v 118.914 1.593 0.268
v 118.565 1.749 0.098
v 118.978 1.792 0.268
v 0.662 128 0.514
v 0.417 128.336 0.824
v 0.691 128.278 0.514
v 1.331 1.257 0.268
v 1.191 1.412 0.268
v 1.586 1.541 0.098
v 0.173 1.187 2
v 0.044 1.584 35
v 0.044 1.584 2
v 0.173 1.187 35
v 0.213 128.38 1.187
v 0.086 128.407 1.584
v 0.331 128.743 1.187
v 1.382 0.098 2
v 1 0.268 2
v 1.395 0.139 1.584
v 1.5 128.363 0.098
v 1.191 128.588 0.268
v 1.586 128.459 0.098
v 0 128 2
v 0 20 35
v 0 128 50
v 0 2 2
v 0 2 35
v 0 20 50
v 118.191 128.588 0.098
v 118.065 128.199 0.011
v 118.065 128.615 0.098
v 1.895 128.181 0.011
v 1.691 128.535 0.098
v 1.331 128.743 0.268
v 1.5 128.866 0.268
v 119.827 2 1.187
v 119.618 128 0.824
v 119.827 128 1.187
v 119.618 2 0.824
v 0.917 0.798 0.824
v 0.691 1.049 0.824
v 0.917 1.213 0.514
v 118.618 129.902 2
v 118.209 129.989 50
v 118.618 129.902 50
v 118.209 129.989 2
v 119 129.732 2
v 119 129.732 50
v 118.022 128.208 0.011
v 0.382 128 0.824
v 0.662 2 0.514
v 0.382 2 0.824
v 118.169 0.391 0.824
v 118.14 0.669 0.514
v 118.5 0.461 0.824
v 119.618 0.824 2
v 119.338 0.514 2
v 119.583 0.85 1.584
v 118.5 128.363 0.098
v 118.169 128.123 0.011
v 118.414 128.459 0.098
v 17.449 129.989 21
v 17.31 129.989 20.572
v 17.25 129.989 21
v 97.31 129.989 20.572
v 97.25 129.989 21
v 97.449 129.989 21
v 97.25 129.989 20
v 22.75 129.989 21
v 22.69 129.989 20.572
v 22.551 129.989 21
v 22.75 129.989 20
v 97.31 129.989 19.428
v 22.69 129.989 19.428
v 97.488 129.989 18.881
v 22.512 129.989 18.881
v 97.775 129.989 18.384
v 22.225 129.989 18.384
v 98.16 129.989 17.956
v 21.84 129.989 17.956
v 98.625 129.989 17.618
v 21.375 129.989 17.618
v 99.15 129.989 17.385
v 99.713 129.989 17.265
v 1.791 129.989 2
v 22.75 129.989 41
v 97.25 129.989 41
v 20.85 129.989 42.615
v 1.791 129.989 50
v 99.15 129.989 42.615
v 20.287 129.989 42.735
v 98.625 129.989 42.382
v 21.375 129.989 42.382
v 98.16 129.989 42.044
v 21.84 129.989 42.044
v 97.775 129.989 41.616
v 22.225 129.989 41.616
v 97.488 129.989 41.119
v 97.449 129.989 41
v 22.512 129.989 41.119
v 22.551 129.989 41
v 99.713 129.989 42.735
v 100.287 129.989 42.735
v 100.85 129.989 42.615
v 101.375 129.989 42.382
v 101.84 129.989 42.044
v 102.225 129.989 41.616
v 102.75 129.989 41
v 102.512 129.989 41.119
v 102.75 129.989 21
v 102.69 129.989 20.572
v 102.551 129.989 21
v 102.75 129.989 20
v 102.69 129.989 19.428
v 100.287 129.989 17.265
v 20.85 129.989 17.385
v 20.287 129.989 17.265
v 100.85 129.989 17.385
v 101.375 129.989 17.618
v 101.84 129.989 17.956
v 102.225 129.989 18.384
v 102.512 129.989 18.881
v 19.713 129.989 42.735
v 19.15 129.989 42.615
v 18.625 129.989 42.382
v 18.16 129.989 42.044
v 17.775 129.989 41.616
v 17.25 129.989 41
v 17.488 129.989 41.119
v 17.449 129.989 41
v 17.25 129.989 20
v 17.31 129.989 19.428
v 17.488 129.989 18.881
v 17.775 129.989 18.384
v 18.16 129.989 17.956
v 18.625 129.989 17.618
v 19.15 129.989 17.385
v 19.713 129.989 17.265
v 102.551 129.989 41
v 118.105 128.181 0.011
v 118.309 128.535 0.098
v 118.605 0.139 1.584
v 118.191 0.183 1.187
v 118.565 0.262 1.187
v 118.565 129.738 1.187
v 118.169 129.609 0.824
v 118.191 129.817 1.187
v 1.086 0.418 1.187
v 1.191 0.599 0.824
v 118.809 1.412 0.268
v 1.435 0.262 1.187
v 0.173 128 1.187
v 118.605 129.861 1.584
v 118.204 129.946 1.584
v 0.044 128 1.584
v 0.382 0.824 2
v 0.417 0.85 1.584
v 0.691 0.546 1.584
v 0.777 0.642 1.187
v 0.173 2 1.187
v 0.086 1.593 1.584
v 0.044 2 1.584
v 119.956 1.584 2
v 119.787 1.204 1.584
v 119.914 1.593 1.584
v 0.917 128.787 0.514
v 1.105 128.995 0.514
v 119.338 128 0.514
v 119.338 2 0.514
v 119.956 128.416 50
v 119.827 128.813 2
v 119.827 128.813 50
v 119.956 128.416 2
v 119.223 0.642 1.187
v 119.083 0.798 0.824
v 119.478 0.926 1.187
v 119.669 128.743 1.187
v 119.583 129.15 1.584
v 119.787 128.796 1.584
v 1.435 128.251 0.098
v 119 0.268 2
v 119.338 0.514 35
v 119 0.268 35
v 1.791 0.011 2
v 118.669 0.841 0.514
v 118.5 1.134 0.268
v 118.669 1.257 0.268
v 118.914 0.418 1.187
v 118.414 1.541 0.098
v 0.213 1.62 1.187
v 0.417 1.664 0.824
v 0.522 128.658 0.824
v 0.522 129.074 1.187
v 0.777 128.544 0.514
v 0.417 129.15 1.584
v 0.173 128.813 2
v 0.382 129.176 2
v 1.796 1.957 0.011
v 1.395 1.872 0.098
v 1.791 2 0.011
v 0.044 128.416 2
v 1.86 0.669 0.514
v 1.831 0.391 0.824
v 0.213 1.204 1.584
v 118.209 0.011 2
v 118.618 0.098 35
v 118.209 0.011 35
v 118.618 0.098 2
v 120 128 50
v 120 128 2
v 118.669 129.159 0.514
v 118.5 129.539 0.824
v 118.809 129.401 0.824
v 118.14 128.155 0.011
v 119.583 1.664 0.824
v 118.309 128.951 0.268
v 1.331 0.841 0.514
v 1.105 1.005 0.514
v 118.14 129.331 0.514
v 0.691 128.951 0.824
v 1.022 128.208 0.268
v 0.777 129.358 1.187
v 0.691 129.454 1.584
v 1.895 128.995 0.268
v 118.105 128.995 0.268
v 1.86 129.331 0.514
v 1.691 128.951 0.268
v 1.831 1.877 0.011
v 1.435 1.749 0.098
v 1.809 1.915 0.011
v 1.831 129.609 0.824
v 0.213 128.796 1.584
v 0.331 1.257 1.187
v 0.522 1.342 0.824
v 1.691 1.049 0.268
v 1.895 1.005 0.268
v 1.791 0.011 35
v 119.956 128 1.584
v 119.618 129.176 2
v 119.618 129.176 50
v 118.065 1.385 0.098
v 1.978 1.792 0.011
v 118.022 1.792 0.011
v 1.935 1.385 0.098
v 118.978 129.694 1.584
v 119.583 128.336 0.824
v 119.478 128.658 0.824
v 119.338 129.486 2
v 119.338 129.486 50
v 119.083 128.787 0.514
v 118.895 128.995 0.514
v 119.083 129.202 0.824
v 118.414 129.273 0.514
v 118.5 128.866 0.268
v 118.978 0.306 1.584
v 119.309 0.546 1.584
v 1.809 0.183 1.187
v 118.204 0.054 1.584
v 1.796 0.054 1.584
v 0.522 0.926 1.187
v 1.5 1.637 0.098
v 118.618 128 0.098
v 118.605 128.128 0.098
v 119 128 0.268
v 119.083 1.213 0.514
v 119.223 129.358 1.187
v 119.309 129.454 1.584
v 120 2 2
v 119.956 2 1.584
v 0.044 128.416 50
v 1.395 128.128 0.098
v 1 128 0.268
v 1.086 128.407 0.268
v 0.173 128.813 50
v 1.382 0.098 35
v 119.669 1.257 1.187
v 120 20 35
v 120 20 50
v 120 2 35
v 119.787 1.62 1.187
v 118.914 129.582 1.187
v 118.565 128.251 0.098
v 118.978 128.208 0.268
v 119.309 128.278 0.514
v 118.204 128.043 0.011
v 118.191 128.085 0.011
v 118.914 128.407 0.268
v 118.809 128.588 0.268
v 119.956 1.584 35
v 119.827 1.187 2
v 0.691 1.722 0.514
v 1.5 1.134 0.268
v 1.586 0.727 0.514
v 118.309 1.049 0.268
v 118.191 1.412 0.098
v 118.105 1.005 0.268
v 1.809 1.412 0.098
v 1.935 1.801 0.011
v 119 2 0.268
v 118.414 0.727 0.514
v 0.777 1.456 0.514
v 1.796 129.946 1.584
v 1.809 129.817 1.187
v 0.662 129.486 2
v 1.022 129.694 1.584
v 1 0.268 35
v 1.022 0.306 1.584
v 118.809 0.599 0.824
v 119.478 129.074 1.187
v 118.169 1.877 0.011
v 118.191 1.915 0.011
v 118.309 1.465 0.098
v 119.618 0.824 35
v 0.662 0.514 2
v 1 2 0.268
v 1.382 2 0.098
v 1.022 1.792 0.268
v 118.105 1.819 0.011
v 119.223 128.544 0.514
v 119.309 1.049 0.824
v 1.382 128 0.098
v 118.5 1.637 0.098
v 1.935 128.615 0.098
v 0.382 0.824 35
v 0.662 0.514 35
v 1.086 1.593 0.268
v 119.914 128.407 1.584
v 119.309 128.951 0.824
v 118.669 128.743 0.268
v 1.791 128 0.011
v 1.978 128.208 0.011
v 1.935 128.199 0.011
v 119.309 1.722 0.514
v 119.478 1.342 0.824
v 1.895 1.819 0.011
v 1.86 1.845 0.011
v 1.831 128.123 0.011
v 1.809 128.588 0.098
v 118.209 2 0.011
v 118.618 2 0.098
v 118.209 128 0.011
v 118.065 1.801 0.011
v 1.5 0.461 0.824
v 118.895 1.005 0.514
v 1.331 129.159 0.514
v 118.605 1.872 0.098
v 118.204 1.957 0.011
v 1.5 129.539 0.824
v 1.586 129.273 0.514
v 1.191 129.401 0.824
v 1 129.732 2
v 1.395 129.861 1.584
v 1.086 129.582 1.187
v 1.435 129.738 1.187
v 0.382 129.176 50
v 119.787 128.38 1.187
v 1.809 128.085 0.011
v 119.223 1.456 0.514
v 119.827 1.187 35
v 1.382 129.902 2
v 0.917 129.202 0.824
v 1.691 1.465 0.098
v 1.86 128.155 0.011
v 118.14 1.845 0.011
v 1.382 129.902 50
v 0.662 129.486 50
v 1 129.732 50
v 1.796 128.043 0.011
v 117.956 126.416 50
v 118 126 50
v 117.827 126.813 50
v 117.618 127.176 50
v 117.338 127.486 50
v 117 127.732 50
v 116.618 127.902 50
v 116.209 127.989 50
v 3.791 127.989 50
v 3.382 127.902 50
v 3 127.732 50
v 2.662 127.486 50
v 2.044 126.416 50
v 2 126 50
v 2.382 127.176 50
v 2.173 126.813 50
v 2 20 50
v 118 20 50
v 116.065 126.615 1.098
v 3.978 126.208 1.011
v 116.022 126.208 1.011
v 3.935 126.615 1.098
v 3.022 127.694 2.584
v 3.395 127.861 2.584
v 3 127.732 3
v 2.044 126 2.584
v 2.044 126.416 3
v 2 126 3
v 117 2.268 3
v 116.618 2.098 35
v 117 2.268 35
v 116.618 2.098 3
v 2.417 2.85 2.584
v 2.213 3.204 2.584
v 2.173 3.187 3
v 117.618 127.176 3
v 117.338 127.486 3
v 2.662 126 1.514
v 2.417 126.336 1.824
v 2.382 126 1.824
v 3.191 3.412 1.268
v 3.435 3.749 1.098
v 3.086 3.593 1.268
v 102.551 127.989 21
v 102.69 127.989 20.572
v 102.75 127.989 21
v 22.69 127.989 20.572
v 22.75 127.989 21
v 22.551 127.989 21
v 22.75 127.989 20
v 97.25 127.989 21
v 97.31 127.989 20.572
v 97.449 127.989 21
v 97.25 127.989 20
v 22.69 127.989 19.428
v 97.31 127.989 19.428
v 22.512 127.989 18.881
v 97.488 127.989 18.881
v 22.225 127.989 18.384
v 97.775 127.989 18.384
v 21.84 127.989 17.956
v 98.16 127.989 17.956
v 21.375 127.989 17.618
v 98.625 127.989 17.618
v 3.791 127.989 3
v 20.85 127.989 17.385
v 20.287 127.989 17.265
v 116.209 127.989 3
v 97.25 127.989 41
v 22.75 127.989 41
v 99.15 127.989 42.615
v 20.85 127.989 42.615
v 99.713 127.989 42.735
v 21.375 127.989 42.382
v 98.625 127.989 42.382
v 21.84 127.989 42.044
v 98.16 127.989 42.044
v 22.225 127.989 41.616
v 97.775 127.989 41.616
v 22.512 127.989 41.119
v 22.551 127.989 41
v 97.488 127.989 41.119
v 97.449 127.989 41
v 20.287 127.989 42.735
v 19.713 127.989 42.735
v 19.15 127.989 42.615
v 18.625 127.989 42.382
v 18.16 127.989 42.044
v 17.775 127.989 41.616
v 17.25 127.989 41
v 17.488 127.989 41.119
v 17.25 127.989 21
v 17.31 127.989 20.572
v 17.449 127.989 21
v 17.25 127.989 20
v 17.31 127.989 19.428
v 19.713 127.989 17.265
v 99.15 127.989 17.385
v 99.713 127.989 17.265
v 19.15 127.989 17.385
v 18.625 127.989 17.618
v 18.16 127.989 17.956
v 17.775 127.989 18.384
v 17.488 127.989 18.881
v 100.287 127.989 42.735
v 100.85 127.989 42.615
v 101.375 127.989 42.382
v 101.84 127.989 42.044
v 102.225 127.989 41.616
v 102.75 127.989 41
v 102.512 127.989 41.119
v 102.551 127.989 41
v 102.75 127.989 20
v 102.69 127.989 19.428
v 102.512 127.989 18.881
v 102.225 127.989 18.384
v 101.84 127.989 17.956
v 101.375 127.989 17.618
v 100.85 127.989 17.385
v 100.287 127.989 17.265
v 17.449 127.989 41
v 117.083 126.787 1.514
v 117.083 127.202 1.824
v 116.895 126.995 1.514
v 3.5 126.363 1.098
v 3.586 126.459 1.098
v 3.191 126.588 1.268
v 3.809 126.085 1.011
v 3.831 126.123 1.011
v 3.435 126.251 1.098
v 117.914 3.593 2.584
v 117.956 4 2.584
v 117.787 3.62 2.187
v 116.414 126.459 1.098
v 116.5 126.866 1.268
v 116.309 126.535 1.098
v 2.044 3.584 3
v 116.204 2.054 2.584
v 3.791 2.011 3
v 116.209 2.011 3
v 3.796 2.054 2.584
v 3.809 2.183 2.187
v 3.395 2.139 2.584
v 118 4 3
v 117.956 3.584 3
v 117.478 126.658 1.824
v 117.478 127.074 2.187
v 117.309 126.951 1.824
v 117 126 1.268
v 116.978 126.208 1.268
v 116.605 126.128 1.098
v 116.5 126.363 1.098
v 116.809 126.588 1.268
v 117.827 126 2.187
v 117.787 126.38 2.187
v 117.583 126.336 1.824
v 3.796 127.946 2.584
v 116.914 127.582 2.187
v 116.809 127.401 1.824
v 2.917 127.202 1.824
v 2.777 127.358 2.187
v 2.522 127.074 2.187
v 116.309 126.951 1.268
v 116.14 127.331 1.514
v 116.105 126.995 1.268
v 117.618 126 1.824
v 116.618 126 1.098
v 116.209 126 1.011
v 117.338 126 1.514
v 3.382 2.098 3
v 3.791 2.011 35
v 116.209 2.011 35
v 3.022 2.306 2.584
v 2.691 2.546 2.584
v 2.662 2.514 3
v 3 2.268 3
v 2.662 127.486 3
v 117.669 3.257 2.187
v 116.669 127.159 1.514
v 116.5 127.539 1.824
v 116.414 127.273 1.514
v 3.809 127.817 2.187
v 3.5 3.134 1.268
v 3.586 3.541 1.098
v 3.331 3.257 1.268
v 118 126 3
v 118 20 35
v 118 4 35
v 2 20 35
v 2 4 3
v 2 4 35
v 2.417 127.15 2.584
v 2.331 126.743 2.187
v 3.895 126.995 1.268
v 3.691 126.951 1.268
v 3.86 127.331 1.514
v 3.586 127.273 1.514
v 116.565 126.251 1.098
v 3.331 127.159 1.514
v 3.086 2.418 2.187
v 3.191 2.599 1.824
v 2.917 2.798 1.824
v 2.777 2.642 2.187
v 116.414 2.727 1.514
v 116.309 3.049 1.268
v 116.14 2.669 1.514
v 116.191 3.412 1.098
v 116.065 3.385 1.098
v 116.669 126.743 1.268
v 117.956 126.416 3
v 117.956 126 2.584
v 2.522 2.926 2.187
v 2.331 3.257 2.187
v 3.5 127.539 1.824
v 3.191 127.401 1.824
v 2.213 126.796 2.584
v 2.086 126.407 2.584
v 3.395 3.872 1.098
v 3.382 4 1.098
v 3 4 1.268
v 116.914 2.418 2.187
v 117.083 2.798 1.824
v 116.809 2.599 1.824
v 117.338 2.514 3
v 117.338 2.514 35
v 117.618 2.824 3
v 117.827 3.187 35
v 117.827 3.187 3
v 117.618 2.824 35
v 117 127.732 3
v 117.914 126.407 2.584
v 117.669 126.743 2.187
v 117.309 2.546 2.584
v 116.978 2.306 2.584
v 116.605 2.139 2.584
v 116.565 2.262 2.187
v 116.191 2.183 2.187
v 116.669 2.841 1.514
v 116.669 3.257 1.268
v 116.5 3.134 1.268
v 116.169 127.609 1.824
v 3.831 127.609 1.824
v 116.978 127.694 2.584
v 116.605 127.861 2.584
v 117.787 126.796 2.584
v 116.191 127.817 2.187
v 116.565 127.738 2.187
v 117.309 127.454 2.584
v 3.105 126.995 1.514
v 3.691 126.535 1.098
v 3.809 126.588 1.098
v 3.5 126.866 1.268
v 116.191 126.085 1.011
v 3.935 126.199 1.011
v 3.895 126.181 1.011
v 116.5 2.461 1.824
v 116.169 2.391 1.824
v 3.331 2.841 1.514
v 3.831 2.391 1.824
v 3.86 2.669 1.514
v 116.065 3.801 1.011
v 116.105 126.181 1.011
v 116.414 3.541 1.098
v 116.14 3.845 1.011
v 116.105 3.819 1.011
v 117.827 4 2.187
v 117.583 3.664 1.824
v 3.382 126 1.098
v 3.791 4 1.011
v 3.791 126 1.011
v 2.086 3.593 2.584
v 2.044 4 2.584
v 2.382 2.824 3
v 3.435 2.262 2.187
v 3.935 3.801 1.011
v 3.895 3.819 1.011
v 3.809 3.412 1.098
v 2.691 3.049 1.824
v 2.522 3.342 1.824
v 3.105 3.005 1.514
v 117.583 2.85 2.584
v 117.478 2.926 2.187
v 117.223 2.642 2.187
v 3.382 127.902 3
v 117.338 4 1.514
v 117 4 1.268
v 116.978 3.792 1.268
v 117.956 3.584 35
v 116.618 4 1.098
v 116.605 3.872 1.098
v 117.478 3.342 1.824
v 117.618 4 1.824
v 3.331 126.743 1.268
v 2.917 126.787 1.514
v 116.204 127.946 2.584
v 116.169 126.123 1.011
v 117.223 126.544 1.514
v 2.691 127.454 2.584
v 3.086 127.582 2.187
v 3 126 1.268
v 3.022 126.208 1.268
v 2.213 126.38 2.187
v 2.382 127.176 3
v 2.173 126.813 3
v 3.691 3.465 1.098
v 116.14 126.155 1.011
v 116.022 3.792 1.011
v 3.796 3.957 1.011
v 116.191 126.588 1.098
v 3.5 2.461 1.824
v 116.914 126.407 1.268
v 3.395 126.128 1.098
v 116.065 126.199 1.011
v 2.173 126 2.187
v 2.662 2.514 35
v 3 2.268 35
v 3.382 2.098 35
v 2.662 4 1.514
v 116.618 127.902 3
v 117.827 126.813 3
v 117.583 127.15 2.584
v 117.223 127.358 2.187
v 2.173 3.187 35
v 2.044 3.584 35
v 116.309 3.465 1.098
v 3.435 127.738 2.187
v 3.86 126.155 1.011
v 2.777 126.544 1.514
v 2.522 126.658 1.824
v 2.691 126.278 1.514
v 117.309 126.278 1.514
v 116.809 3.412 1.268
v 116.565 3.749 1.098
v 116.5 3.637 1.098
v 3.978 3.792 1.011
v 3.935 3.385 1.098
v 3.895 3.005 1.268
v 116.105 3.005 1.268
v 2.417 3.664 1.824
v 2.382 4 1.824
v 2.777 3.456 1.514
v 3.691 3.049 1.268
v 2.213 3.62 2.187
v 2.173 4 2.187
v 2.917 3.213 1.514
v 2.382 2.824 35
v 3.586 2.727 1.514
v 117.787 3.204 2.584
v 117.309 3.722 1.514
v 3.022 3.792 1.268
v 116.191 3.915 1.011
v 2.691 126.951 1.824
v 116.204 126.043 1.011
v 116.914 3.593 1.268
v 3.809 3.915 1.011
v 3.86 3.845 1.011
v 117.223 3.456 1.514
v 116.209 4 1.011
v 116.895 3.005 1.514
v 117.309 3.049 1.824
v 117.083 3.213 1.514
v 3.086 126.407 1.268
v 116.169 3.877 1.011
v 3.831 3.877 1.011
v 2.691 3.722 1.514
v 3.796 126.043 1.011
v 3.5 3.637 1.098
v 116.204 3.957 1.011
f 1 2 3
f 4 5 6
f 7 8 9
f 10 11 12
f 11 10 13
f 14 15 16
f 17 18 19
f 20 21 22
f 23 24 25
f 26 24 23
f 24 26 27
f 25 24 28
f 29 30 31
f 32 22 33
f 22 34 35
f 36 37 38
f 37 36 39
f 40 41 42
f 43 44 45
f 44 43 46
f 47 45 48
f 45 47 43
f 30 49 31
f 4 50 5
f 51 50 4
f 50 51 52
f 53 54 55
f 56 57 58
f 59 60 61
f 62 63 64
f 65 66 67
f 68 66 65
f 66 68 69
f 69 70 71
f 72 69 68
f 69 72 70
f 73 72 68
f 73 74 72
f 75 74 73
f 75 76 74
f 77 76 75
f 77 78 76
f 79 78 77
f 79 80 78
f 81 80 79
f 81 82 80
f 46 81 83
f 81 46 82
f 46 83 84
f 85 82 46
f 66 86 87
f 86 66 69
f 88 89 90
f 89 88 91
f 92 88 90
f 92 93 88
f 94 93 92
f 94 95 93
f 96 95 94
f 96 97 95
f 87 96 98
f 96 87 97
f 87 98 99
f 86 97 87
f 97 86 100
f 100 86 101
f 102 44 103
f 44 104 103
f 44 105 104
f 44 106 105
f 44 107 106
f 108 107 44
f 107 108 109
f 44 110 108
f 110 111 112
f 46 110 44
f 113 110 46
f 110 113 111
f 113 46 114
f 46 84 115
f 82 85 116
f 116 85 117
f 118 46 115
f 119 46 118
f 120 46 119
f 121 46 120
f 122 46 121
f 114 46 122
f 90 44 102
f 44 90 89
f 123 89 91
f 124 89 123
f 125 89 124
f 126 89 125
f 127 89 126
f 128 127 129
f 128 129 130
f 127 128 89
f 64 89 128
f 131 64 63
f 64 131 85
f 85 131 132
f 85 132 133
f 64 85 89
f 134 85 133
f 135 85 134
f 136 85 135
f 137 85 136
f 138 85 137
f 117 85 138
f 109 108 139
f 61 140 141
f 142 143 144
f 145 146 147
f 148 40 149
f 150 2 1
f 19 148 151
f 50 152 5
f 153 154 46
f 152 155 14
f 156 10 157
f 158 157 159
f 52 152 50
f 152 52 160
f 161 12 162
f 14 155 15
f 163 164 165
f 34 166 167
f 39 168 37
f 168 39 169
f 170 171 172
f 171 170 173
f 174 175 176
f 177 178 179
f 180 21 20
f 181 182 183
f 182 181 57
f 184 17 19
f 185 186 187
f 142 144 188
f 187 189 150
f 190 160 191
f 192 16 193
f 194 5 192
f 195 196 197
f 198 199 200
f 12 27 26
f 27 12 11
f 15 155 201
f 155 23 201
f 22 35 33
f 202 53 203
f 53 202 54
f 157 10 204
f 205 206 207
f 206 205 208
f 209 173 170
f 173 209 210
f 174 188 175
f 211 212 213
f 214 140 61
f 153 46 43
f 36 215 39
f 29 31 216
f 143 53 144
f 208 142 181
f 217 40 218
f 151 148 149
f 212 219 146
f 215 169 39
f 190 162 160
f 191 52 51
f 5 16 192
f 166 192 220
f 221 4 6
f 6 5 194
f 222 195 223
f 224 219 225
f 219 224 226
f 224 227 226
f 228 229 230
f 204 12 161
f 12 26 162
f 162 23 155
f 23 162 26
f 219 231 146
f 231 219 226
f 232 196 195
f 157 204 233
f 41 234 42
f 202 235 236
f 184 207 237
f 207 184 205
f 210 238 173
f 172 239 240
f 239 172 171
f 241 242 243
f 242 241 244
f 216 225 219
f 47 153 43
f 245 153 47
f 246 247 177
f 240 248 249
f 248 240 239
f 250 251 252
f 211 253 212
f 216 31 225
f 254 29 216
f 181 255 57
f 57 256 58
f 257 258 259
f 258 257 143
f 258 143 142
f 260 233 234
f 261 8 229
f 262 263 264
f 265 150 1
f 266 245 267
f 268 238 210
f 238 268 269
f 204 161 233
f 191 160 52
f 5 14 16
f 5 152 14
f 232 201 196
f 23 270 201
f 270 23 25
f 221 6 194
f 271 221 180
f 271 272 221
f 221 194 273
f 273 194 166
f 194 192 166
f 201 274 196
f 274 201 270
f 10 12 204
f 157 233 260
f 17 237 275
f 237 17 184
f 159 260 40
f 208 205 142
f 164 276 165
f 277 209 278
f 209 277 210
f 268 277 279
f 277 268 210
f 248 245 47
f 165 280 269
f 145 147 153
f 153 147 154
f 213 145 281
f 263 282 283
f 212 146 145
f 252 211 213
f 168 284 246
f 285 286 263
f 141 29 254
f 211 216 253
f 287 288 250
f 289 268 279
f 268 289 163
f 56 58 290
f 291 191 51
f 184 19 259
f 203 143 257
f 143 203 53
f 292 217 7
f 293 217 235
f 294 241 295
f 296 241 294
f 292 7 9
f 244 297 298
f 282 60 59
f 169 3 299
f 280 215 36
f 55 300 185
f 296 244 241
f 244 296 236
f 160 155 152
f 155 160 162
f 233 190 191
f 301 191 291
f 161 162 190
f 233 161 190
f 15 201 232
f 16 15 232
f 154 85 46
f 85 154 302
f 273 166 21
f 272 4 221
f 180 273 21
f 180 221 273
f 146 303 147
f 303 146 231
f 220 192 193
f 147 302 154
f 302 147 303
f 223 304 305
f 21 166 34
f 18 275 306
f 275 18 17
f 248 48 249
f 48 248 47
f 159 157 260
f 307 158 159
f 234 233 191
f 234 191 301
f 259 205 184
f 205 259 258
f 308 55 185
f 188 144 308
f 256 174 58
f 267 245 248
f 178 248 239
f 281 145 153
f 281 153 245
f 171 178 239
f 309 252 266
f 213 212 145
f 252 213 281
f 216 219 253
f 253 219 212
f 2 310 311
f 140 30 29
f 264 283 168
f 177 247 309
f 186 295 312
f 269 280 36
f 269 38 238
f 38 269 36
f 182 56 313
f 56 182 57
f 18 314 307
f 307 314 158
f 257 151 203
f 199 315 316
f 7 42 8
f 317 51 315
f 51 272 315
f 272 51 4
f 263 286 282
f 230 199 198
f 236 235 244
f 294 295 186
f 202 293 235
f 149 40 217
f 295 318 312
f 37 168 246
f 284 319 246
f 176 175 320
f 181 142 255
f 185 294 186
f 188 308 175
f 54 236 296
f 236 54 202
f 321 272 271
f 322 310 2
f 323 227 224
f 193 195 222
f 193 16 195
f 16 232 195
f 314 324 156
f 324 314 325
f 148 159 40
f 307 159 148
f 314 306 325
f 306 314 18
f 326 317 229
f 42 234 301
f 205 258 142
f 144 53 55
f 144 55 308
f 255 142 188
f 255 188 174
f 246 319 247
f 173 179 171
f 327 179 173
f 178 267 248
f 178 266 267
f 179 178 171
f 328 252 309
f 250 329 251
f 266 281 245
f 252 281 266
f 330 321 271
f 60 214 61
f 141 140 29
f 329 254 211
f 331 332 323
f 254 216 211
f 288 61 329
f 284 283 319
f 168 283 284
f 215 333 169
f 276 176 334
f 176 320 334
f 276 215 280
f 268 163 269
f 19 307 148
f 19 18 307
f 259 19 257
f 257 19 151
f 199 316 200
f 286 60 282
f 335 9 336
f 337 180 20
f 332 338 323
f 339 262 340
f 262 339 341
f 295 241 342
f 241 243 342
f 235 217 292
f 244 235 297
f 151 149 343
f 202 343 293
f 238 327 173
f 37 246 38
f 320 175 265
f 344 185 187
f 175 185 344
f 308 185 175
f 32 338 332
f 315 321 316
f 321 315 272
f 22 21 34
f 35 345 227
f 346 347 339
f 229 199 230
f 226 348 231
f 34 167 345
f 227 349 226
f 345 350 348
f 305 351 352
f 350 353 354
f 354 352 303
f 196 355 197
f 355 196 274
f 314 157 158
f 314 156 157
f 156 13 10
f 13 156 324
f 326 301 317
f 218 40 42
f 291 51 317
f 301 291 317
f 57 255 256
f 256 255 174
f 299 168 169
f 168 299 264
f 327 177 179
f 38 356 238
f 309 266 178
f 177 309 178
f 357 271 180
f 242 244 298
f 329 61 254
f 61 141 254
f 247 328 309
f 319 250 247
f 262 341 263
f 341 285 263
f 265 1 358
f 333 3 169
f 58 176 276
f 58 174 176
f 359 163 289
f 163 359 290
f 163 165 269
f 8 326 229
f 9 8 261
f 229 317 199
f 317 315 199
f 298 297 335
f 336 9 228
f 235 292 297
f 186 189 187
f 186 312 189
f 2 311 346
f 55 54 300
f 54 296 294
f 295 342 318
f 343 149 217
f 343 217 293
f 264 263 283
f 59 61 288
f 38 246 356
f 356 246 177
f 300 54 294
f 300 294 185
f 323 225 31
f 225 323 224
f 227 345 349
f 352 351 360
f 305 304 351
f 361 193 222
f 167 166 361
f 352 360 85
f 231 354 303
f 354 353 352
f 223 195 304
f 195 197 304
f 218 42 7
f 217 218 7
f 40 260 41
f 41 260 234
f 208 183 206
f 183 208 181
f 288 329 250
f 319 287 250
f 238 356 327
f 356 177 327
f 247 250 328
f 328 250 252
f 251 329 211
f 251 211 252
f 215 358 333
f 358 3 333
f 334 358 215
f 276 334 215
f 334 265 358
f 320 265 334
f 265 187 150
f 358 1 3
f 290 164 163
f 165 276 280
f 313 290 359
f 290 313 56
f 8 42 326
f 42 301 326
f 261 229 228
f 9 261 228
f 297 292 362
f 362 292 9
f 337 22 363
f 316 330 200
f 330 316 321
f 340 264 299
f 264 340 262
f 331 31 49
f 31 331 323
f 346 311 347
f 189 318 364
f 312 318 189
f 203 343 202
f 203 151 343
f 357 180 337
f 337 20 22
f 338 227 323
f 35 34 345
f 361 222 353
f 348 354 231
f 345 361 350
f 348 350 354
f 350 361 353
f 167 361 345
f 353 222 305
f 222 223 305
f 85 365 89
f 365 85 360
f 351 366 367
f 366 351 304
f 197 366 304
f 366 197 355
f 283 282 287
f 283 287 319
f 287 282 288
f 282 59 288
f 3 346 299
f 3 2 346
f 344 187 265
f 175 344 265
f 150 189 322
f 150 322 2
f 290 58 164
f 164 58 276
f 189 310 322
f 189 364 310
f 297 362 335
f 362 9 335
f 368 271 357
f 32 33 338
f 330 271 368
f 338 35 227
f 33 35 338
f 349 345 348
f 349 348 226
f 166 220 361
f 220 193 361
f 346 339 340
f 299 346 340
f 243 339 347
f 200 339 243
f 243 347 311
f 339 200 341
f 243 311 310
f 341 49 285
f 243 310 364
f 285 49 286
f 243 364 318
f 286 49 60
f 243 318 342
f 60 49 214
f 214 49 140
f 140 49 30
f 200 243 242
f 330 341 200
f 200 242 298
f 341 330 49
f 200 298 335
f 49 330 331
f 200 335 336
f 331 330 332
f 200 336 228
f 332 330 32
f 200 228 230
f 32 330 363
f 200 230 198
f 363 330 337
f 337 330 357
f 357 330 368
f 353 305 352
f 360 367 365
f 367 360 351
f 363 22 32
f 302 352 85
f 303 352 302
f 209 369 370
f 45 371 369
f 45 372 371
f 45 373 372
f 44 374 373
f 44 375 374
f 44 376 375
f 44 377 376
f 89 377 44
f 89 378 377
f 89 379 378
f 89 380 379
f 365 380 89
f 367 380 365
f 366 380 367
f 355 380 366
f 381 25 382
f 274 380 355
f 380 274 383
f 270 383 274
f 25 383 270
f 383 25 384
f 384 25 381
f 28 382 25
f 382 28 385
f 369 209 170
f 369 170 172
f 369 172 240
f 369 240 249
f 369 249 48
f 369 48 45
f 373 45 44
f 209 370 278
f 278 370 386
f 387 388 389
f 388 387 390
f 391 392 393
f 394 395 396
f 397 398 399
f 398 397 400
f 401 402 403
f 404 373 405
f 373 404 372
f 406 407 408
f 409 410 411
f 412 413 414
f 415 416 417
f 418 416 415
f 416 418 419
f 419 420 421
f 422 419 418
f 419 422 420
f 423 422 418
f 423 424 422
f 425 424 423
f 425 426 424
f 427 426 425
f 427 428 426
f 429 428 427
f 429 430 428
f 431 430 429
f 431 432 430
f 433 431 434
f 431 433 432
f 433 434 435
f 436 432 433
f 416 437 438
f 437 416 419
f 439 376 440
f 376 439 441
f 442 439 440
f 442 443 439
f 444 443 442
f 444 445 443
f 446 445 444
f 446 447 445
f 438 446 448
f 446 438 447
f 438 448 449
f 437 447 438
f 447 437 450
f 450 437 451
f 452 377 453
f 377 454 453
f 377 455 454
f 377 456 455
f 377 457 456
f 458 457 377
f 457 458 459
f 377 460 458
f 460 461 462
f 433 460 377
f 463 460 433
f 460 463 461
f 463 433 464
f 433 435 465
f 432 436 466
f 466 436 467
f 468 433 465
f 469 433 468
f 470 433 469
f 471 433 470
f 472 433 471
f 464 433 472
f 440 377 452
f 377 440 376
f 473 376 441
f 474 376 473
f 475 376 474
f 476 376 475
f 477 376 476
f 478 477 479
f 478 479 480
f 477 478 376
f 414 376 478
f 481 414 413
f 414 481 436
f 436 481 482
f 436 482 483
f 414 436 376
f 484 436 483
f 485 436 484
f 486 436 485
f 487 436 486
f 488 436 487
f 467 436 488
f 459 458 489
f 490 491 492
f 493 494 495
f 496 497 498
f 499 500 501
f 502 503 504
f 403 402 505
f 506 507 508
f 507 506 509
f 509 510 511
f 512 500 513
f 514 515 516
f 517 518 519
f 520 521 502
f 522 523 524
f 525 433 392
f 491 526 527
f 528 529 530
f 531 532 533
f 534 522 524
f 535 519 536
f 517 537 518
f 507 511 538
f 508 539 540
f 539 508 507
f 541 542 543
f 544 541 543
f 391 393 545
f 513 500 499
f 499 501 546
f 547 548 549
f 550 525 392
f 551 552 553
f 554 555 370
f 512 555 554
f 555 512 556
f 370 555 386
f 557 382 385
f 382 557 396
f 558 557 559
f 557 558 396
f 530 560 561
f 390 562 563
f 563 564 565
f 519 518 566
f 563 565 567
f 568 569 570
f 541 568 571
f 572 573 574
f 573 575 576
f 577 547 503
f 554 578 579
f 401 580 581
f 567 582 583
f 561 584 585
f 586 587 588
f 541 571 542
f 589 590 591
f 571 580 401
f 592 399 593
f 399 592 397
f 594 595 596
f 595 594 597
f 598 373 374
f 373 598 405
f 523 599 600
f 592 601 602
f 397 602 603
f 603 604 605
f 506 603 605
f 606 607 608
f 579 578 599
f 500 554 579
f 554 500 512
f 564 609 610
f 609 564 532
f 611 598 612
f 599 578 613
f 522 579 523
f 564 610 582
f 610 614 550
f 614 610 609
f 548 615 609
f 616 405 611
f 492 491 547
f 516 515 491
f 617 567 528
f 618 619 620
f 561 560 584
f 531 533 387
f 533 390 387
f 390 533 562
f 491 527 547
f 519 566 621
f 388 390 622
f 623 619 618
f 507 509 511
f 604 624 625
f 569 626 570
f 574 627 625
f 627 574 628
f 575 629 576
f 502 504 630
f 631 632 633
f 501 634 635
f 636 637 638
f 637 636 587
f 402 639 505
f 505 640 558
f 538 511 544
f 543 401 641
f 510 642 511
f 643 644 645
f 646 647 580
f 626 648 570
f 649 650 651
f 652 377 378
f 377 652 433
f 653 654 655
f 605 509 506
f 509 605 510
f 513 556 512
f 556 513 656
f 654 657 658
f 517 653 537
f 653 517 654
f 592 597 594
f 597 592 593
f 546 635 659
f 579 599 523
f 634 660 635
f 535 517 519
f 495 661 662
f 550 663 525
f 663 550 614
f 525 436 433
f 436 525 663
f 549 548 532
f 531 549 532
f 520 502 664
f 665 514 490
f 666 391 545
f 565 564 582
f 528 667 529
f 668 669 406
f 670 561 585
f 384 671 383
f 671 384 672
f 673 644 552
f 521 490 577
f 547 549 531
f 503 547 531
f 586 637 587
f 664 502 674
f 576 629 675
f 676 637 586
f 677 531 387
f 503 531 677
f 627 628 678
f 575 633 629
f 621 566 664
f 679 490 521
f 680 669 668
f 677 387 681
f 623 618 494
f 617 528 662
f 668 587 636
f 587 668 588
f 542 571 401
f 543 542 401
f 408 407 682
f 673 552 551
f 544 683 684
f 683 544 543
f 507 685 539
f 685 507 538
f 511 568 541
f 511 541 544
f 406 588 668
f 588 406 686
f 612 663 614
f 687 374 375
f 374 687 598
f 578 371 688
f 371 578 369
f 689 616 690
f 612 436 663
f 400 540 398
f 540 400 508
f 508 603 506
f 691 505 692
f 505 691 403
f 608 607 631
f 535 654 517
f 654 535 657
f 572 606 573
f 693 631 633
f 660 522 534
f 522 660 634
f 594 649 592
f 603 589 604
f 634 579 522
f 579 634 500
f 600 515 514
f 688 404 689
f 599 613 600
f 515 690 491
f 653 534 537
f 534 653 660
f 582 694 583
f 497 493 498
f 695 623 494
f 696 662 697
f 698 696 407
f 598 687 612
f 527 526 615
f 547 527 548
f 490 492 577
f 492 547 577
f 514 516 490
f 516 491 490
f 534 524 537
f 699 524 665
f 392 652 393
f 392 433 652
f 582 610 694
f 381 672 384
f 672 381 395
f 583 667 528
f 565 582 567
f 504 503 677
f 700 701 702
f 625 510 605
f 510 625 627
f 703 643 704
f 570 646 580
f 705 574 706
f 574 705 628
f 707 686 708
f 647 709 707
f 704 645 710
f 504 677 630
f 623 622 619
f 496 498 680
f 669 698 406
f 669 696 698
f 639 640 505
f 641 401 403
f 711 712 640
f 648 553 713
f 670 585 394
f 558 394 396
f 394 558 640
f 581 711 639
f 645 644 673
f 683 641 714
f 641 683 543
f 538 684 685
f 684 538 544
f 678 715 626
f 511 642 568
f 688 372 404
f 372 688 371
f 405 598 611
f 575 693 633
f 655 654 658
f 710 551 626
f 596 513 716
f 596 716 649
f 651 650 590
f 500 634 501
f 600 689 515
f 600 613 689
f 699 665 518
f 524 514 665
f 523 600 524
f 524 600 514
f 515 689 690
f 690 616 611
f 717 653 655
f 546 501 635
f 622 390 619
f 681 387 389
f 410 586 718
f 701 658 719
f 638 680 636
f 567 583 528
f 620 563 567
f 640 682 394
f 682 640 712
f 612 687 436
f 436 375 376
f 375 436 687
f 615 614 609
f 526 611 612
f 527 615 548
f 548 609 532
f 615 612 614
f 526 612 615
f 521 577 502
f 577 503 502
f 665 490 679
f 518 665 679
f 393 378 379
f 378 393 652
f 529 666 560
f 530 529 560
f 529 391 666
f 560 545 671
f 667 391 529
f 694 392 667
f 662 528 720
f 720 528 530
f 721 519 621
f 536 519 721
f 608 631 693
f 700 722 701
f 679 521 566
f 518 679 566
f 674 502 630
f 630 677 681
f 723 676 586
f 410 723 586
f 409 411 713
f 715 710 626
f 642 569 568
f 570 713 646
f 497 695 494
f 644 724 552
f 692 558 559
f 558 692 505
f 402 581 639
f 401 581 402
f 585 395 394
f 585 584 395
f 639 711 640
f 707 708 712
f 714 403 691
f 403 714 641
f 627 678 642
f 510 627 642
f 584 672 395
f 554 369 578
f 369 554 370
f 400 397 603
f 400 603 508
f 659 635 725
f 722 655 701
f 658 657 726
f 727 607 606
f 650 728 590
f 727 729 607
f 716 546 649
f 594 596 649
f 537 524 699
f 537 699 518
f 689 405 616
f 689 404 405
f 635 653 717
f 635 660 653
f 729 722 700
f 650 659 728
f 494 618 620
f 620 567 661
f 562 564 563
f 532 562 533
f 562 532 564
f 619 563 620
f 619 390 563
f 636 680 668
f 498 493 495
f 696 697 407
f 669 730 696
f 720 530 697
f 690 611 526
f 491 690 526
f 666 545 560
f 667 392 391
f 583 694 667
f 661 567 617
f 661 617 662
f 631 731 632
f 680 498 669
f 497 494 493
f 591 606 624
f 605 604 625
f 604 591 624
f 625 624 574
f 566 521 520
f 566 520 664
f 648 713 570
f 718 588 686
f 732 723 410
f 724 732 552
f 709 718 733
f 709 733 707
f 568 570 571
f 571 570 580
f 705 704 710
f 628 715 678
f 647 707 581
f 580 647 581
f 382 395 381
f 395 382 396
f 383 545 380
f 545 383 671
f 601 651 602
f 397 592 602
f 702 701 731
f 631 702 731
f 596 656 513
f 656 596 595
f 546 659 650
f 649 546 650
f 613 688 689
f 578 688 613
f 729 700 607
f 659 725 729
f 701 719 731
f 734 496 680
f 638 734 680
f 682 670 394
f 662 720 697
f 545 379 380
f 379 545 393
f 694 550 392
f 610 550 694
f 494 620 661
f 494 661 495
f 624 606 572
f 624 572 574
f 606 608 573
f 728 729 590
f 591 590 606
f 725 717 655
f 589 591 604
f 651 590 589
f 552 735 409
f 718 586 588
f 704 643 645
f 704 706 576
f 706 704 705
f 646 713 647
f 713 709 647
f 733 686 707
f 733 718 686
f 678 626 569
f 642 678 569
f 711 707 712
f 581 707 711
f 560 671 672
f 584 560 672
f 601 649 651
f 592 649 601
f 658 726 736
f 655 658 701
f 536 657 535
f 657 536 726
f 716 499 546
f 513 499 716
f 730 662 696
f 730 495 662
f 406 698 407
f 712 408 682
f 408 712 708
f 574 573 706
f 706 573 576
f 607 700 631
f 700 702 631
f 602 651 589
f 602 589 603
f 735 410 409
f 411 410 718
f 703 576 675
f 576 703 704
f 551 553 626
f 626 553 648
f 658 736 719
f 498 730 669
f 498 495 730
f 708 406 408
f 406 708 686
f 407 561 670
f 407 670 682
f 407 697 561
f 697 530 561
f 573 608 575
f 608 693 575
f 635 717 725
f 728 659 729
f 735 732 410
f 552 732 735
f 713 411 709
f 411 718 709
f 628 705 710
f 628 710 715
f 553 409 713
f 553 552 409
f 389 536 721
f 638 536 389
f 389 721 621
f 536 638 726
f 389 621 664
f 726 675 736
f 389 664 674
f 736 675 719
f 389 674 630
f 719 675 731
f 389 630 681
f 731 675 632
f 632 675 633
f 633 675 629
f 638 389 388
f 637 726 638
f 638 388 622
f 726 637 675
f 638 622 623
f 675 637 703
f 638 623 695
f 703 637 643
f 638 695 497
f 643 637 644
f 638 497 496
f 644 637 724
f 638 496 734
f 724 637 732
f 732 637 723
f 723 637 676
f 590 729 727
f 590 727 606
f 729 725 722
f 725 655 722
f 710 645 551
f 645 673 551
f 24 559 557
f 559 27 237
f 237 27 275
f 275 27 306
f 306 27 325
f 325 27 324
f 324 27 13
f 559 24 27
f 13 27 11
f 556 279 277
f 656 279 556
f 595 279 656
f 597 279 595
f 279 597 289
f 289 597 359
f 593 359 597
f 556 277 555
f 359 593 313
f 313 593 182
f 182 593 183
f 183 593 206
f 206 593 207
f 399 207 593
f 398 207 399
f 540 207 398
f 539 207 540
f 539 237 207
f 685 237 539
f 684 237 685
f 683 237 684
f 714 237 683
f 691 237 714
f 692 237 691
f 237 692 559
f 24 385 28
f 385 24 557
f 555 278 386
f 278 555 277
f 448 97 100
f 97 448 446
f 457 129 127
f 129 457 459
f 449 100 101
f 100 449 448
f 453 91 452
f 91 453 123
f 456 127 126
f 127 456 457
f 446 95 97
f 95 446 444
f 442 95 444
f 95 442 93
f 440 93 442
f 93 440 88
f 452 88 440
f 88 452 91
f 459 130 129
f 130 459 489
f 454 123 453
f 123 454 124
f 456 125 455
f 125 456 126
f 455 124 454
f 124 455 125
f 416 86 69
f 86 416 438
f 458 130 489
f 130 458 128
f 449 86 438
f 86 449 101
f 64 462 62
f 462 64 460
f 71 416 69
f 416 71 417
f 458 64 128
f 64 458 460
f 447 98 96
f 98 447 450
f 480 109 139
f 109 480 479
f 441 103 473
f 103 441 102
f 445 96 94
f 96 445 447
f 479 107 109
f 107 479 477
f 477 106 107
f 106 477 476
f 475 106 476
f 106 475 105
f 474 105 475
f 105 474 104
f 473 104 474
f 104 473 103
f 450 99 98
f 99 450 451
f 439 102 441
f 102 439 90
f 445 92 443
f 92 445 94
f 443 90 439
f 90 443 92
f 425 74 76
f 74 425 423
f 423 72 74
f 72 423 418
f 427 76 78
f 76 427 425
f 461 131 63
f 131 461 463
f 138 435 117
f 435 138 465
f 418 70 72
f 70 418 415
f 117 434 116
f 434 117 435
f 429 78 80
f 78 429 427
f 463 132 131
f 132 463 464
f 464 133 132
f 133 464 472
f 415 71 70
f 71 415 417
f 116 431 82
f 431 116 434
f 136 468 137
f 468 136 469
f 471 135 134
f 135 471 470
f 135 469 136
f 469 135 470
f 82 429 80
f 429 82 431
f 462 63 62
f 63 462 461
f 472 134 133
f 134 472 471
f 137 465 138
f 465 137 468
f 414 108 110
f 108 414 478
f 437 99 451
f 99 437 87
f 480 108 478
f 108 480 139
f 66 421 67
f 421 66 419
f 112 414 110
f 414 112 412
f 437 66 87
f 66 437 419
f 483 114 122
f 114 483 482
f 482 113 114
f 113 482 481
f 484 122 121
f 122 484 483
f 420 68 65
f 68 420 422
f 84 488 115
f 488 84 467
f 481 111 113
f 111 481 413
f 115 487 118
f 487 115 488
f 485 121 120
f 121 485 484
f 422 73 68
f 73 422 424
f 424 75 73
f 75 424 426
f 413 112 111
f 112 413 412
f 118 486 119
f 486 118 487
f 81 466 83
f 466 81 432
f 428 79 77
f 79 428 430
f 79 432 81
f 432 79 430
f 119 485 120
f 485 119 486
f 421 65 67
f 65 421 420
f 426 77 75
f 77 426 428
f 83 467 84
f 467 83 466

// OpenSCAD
// greetings from Heinrich Schnermann, Laatzen
// ender 3 toolbox

$fn = 30;

length = 120; // 120 seems good with cables behind
width = 130; // 130 is perfect for ender 3
height = 50; // 50 is a good match

difference() {
    kaestchen(length, width, height, 2, false);
    // y rod space
    translate([-1, -1, 35])
        cube([length + 2, 21, height - 34]);
    // mount/tool holes
    translate([20, width - 3, height - 10])
        rotate([270, 0, 0])
        cylinder(4, d = 5.5, d = 5.5);
    translate([20 - 2.75, width -3, 21])
        cube([5.5, 4, 20]);
    translate([length - 20, width - 3, height - 10])
        rotate([270, 0, 0])
        cylinder(4, d = 5.5, d = 5.5);
    translate([20, width - 3, height - 30])
        rotate([270, 0, 0])
        cylinder(4, d = 5.5, d = 5.5);
    translate([length - 20 - 2.75, width -3, 21])
        cube([5.5, 4, 20]);
    translate([length -20, width - 3, height - 30])
        rotate([270, 0, 0])
        cylinder(4, d = 5.5, d = 5.5);
}


module kaestchen(x = 10, y = 10, z = 5, r = 1, center = true) {
    if (center != true) {
        a = x / 2;
        b = y / 2;
        c = (z + r) / 2;
    }
    translate([x / 2, y / 2, (z + r) / 2]) {
        kaestchen_ohne_translation(x, y, z, r);
    }
}
module kaestchen_ohne_translation(x, y, z, r) {    
     difference() {
// Aussen
       minkowski() {
            cube([x - 2 * r, y - 2 * r, z - r], center = true);
            sphere(r);
        }
// oberer Rand    
        translate([0, 0, (z + 1) / 2 ]) {
            cube([x + 1, y + 1, r  + 1], center = true);
        }
// Ausschnitt   
        translate([0, 0, r]) {
            minkowski() {
                cube([x - 4 * r, y - 4 * r, z], center = true);
                sphere(r);
            }
        }
    }
}
